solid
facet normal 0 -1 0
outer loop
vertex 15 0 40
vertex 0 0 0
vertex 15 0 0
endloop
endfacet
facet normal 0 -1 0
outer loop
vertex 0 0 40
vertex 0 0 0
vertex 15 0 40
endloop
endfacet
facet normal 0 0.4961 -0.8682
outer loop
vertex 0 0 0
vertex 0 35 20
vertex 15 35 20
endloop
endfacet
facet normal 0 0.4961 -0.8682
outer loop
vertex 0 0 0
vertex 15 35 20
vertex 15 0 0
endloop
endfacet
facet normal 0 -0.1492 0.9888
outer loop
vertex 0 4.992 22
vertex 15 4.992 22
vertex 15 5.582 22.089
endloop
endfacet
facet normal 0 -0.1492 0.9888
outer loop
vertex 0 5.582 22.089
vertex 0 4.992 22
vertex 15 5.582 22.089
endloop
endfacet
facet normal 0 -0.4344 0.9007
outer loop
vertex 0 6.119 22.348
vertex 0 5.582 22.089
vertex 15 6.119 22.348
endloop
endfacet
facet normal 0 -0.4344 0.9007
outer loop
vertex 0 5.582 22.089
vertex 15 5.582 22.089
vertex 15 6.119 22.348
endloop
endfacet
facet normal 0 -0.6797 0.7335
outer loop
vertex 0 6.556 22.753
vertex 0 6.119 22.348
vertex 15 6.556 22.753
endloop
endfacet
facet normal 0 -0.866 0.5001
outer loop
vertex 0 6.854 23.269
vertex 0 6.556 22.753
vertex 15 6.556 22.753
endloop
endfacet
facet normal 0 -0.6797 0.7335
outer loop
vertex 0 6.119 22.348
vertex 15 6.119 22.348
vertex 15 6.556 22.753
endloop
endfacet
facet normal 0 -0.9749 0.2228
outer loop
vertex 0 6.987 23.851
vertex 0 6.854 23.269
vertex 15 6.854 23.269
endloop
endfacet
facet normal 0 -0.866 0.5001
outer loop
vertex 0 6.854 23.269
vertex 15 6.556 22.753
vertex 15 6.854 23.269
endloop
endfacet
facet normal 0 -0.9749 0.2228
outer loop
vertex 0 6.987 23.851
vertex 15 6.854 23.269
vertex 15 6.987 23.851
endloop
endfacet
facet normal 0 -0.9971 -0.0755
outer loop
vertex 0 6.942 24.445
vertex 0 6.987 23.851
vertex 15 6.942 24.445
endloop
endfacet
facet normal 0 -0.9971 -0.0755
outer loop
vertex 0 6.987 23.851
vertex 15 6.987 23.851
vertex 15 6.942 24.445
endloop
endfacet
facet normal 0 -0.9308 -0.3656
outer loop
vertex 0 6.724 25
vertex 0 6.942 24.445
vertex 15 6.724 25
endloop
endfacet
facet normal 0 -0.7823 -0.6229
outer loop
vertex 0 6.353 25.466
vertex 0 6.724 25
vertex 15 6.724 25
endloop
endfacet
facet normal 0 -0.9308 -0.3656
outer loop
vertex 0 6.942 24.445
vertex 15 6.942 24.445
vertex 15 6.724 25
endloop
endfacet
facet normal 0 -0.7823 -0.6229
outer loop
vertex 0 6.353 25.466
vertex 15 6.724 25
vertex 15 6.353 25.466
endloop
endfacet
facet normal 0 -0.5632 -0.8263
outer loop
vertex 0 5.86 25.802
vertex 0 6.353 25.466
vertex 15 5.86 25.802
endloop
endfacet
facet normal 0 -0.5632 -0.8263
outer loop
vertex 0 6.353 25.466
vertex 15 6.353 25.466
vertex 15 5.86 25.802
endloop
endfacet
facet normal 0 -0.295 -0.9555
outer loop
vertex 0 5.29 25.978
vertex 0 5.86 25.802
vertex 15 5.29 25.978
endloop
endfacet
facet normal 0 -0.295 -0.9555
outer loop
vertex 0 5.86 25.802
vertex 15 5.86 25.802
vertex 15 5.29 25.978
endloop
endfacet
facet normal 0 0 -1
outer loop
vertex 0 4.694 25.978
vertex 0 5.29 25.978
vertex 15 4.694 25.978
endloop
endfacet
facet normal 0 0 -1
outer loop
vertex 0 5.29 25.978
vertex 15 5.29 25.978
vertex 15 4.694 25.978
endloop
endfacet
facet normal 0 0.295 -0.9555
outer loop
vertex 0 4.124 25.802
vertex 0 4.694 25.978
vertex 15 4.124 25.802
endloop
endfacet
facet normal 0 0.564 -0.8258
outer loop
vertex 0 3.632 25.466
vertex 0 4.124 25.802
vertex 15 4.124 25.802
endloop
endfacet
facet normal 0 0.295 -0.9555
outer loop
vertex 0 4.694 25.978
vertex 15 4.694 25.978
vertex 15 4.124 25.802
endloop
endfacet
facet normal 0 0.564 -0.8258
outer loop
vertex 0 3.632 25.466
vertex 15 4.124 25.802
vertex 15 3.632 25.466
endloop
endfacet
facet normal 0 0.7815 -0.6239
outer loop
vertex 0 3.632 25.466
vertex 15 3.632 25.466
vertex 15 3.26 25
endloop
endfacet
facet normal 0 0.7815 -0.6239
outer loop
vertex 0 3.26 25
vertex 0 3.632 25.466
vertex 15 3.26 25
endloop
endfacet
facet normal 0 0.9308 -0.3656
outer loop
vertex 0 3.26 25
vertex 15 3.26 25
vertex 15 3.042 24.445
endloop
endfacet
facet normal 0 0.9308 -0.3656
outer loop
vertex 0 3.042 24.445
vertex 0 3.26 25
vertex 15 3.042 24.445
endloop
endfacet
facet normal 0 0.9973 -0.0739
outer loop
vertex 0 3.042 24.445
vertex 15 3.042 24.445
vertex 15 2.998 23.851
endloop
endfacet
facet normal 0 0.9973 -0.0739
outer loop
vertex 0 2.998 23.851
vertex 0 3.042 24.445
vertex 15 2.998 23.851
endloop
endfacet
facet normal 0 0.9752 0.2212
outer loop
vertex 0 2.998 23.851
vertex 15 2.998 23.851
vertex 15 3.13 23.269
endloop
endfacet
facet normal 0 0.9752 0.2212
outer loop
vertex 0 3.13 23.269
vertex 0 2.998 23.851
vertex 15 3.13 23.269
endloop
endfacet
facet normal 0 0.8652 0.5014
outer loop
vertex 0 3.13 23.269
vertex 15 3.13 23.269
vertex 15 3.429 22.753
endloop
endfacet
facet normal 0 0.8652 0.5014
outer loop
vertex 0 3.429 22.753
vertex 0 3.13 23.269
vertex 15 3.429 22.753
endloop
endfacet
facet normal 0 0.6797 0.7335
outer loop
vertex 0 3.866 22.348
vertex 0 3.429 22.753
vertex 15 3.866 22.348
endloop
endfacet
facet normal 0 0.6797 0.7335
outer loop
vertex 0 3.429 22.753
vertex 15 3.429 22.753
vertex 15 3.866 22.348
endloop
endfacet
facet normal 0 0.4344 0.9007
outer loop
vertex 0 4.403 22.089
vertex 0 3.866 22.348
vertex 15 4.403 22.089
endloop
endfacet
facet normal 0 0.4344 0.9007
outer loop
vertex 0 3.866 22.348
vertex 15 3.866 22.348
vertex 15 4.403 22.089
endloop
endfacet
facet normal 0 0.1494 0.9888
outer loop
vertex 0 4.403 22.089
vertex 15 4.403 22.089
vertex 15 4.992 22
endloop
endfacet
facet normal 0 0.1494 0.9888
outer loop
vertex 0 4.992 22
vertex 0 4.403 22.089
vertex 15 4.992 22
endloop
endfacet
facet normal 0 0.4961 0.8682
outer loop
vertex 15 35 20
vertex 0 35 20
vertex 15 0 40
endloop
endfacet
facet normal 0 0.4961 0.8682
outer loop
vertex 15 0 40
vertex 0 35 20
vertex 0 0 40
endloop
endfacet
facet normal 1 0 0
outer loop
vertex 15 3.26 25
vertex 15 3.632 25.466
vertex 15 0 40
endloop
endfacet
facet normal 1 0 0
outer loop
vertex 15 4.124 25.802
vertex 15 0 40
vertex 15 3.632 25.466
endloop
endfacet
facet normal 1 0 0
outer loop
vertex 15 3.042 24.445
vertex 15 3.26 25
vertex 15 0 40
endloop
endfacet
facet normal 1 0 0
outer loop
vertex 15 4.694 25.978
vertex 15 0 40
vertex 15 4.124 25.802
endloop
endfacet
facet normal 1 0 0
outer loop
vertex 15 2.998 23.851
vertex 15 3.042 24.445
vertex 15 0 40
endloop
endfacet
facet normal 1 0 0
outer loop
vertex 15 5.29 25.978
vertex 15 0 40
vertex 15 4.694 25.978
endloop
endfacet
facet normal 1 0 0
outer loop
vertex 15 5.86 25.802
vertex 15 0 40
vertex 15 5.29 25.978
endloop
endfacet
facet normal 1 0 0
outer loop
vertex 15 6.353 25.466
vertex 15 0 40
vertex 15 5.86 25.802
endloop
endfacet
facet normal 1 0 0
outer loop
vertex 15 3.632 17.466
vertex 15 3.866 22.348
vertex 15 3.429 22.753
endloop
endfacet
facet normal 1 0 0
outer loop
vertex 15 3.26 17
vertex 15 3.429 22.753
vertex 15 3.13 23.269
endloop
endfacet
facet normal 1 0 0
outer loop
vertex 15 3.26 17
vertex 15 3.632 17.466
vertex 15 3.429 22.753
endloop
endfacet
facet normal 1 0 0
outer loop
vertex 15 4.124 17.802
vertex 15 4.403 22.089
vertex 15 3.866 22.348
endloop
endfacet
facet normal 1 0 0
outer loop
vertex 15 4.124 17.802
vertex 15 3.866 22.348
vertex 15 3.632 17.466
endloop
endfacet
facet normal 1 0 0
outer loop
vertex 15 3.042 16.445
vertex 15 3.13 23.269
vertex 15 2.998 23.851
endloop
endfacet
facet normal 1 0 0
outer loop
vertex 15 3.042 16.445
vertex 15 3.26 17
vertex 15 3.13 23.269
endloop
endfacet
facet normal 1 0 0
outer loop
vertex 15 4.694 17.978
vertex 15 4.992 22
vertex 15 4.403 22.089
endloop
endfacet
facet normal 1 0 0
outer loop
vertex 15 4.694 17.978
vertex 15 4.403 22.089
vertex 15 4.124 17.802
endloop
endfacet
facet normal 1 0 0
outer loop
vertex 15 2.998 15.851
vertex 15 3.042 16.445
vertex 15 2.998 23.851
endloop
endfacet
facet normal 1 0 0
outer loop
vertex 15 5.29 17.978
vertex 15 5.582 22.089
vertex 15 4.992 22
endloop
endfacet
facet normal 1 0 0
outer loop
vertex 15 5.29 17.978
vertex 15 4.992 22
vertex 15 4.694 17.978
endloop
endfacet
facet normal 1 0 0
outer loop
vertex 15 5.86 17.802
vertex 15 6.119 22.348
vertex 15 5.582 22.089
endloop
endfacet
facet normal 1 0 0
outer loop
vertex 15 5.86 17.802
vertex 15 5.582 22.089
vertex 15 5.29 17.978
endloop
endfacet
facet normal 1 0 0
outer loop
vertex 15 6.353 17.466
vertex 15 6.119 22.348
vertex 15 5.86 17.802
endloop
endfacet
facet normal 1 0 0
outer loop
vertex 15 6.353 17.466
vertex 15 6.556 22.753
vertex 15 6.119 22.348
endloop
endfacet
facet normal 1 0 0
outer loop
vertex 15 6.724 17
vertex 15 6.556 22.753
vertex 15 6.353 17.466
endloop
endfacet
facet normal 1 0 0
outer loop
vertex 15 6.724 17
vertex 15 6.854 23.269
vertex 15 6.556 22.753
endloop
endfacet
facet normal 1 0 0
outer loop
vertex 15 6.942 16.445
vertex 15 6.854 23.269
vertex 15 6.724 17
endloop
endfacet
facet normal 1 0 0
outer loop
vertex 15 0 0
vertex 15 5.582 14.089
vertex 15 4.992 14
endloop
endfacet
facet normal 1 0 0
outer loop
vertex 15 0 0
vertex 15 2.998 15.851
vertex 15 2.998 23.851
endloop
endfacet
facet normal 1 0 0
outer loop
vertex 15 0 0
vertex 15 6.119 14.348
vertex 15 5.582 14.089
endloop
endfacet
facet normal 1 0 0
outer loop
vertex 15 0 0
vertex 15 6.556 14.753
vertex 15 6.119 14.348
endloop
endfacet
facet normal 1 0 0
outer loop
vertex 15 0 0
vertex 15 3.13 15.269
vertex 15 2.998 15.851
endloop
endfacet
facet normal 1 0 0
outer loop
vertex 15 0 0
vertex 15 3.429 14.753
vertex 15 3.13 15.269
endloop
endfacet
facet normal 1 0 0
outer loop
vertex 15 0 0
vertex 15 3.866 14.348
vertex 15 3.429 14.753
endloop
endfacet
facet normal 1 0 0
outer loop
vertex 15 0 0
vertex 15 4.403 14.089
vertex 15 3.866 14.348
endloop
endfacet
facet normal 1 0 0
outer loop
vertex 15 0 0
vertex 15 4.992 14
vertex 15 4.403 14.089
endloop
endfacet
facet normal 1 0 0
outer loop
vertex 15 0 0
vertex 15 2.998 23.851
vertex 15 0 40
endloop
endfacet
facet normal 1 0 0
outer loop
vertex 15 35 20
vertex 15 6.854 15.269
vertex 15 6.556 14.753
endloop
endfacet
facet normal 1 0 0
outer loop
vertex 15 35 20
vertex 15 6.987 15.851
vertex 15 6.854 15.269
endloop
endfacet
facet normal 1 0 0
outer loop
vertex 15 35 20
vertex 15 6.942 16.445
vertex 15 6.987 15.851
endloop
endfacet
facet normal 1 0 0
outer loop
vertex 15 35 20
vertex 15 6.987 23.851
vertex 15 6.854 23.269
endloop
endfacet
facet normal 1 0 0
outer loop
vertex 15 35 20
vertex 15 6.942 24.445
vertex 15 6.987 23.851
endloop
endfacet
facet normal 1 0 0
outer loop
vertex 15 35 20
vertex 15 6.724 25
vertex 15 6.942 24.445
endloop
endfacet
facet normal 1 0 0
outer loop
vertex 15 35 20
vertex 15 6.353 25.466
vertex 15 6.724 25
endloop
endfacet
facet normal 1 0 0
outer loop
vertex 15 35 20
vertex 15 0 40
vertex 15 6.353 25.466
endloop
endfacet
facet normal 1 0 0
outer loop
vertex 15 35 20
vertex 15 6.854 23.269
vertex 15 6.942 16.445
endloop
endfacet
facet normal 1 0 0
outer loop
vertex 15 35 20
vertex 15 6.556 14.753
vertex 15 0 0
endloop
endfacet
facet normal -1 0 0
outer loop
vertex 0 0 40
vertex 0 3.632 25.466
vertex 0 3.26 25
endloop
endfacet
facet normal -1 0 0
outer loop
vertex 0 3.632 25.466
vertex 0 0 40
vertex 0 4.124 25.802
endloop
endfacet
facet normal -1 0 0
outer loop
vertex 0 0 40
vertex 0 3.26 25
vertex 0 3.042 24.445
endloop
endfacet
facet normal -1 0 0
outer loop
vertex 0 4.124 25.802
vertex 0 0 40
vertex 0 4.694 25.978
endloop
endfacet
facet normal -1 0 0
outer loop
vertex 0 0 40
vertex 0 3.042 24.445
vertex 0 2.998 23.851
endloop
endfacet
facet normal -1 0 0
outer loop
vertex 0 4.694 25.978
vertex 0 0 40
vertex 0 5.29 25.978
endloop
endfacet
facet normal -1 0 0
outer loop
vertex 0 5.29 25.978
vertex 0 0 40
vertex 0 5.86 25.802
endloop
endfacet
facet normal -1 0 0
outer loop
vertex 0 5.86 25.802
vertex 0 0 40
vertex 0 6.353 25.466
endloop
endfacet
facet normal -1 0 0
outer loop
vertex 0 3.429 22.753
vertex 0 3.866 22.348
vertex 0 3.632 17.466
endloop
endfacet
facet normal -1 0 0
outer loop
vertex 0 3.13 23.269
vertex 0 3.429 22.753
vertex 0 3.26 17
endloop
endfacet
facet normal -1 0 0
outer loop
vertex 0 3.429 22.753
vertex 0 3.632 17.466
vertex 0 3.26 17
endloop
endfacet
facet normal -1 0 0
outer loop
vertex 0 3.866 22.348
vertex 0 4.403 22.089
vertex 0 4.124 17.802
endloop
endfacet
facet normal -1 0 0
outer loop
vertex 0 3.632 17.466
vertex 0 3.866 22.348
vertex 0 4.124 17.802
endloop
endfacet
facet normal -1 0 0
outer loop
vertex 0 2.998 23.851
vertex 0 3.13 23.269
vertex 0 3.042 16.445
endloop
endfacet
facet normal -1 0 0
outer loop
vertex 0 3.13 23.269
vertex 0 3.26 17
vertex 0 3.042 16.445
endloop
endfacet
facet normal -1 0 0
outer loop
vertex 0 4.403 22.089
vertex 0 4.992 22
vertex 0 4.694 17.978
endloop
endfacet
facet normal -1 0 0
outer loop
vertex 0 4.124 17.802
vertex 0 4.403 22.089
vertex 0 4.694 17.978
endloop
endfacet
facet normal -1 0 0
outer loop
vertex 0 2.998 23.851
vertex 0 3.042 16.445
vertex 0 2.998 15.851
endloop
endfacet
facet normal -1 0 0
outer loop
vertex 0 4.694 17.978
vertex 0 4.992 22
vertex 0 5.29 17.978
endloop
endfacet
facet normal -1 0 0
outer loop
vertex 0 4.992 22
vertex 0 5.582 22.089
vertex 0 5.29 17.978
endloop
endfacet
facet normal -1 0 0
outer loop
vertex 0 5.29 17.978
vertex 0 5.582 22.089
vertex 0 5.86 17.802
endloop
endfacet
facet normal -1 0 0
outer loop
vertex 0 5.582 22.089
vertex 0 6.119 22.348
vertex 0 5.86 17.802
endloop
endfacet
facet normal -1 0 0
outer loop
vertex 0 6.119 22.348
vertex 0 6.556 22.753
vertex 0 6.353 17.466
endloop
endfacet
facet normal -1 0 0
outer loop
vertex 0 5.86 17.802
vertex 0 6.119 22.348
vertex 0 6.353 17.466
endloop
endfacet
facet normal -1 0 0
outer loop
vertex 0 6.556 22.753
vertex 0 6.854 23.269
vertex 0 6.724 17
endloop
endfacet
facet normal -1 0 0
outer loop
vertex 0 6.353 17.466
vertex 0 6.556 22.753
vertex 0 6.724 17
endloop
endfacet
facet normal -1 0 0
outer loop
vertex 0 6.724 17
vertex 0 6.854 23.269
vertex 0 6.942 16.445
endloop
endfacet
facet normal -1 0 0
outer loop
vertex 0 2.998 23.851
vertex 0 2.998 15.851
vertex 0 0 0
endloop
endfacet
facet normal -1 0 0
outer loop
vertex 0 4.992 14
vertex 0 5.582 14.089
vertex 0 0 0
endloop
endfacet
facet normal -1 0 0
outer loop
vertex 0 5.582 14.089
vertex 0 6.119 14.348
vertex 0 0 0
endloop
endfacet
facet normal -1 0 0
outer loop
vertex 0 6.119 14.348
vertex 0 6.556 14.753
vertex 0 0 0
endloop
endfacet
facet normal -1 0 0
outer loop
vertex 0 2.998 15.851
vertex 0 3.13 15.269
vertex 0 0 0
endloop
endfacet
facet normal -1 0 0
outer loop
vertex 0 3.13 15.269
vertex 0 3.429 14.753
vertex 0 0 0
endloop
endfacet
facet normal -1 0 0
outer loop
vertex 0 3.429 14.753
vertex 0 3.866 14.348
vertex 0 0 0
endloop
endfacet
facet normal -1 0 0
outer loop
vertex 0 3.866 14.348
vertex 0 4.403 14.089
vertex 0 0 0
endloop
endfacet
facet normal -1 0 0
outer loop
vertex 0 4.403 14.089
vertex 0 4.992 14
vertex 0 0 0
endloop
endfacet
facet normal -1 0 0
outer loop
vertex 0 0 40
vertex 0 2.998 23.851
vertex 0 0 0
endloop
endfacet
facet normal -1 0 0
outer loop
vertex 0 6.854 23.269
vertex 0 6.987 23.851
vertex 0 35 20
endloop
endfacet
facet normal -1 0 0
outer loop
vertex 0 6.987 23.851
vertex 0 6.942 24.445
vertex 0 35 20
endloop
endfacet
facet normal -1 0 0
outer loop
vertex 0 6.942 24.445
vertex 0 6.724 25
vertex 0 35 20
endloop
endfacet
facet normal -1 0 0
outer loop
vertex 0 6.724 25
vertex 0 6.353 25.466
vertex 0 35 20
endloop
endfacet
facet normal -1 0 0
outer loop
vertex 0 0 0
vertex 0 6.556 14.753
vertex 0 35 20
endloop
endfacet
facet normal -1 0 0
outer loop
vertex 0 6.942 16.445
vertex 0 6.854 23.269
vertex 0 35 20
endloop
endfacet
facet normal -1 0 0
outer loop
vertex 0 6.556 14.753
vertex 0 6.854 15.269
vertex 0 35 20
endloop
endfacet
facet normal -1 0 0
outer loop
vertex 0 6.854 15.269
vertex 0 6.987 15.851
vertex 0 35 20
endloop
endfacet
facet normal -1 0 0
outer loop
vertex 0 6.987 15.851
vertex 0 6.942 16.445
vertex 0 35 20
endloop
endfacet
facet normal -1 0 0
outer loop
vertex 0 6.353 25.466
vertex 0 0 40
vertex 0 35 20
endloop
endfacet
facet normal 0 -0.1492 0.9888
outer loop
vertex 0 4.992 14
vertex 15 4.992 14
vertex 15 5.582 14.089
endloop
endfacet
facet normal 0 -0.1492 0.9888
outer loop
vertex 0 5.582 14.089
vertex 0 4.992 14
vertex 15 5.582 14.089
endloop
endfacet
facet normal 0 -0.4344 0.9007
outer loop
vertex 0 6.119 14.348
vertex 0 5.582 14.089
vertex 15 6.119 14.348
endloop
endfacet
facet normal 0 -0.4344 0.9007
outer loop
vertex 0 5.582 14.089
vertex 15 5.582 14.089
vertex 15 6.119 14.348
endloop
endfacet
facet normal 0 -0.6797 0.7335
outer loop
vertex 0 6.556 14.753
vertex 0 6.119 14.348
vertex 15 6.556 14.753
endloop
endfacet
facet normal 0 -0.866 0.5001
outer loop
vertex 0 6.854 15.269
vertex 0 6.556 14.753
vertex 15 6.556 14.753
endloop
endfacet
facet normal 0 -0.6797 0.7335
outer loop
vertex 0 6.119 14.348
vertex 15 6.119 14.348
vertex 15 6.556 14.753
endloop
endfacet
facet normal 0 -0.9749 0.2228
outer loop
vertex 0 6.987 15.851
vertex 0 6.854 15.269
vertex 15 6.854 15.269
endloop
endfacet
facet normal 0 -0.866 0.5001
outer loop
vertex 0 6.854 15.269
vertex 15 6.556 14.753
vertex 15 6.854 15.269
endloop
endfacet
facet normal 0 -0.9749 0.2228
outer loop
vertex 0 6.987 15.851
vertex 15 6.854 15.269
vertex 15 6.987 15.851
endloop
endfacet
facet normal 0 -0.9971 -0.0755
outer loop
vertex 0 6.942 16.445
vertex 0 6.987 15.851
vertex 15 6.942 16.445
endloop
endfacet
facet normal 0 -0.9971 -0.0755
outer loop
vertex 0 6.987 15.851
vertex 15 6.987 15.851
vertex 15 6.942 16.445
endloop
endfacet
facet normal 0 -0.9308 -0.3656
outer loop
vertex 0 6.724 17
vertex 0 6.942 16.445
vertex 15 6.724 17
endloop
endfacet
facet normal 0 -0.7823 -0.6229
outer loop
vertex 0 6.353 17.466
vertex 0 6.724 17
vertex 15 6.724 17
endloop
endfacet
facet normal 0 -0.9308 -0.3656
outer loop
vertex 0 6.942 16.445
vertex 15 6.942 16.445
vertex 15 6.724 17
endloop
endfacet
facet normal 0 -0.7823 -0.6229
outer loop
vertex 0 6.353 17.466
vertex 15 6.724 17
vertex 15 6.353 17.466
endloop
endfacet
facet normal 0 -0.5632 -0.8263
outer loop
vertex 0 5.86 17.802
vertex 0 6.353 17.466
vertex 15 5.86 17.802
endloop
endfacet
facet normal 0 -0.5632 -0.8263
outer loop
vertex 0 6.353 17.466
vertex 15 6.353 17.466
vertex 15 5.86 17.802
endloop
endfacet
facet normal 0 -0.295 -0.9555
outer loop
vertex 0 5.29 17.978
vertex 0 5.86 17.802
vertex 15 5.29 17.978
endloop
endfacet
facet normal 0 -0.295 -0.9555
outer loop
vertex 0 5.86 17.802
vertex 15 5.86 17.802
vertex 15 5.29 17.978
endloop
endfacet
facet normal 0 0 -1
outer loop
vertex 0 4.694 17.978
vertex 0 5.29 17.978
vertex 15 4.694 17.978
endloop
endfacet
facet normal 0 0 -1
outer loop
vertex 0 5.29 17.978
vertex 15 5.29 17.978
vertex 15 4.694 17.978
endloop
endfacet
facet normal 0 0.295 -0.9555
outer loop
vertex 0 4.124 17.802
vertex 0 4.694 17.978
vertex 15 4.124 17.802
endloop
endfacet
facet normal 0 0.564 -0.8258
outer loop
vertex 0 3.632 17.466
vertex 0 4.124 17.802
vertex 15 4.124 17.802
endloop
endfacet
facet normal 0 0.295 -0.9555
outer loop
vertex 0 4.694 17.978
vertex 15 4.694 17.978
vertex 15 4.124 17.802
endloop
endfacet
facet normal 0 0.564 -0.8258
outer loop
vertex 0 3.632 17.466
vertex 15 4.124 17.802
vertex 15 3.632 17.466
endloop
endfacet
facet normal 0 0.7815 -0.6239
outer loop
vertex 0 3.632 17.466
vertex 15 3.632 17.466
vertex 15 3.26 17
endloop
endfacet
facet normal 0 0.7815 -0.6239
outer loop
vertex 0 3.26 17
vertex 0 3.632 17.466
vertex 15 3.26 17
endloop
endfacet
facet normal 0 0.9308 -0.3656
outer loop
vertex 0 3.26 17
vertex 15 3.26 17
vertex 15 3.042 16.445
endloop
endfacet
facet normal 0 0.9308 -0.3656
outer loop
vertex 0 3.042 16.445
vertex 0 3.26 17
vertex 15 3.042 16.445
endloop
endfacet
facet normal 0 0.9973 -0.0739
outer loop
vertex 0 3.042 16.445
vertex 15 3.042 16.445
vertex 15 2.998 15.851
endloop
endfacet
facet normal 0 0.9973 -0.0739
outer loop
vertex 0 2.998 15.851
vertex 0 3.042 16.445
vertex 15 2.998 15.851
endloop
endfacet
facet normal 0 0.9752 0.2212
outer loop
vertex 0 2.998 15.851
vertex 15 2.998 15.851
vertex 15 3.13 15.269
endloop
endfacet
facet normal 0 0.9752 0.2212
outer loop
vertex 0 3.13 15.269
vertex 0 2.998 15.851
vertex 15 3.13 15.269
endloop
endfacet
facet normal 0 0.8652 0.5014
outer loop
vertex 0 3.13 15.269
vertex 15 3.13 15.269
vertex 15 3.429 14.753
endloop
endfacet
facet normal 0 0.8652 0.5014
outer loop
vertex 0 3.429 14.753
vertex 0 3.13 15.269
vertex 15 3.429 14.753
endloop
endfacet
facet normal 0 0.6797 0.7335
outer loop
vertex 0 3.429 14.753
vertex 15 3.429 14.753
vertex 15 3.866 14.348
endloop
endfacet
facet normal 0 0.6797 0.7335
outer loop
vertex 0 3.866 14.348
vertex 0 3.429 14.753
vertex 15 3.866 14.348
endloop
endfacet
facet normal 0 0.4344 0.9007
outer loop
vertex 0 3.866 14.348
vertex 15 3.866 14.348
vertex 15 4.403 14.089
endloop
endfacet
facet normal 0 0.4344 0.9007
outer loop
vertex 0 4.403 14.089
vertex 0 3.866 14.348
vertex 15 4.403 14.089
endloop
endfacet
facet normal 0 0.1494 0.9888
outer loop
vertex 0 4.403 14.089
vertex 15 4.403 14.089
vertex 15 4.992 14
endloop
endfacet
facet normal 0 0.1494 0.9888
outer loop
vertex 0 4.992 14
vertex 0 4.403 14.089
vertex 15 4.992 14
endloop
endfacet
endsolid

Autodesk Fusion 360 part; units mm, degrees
sketch "Sketch1" plane through (0, 0, 0) normal (1, 0, 0) x (0, 0, -1)
  line L0 (0, 0) -> (-40, 0)
  line L1 (-20, 0) -> (-20, 35)
  line L2 (-20, 35) -> (-40, 0)
  line L3 (-20, 35) -> (0, 0)
  dimension "d1" = 40
  dimension "d2" = 40.3113
extrude "Extrude1" add sketch "Sketch1" along normal blind 5
extrude "Extrude2" add 1 faces at (5, 11.6667, 20) along direction (1, 0, 0) blind 10
sketch "Sketch2" plane through (15, 0, 0) normal (1, 0, 0) x (0, 0, -1)
  line L0 (-20, 35) -> (-40, 0)
  line L1 (-40, 0) -> (0, 0)
  line L2 (0, 0) -> (-20, 35)
  circle A0 centre (-24, 4.9922) radius 2
  circle A1 centre (-16, 4.9922) radius 2
  line L3 (-20, 35) -> (-20, 0)
  dimension "d7" = 4
  dimension "d8" = 4
  dimension "d9" = 4
  dimension "d10" = 4
extrude "Extrude3" cut sketch "Sketch2" against normal blind 31 contours A0 | A1
